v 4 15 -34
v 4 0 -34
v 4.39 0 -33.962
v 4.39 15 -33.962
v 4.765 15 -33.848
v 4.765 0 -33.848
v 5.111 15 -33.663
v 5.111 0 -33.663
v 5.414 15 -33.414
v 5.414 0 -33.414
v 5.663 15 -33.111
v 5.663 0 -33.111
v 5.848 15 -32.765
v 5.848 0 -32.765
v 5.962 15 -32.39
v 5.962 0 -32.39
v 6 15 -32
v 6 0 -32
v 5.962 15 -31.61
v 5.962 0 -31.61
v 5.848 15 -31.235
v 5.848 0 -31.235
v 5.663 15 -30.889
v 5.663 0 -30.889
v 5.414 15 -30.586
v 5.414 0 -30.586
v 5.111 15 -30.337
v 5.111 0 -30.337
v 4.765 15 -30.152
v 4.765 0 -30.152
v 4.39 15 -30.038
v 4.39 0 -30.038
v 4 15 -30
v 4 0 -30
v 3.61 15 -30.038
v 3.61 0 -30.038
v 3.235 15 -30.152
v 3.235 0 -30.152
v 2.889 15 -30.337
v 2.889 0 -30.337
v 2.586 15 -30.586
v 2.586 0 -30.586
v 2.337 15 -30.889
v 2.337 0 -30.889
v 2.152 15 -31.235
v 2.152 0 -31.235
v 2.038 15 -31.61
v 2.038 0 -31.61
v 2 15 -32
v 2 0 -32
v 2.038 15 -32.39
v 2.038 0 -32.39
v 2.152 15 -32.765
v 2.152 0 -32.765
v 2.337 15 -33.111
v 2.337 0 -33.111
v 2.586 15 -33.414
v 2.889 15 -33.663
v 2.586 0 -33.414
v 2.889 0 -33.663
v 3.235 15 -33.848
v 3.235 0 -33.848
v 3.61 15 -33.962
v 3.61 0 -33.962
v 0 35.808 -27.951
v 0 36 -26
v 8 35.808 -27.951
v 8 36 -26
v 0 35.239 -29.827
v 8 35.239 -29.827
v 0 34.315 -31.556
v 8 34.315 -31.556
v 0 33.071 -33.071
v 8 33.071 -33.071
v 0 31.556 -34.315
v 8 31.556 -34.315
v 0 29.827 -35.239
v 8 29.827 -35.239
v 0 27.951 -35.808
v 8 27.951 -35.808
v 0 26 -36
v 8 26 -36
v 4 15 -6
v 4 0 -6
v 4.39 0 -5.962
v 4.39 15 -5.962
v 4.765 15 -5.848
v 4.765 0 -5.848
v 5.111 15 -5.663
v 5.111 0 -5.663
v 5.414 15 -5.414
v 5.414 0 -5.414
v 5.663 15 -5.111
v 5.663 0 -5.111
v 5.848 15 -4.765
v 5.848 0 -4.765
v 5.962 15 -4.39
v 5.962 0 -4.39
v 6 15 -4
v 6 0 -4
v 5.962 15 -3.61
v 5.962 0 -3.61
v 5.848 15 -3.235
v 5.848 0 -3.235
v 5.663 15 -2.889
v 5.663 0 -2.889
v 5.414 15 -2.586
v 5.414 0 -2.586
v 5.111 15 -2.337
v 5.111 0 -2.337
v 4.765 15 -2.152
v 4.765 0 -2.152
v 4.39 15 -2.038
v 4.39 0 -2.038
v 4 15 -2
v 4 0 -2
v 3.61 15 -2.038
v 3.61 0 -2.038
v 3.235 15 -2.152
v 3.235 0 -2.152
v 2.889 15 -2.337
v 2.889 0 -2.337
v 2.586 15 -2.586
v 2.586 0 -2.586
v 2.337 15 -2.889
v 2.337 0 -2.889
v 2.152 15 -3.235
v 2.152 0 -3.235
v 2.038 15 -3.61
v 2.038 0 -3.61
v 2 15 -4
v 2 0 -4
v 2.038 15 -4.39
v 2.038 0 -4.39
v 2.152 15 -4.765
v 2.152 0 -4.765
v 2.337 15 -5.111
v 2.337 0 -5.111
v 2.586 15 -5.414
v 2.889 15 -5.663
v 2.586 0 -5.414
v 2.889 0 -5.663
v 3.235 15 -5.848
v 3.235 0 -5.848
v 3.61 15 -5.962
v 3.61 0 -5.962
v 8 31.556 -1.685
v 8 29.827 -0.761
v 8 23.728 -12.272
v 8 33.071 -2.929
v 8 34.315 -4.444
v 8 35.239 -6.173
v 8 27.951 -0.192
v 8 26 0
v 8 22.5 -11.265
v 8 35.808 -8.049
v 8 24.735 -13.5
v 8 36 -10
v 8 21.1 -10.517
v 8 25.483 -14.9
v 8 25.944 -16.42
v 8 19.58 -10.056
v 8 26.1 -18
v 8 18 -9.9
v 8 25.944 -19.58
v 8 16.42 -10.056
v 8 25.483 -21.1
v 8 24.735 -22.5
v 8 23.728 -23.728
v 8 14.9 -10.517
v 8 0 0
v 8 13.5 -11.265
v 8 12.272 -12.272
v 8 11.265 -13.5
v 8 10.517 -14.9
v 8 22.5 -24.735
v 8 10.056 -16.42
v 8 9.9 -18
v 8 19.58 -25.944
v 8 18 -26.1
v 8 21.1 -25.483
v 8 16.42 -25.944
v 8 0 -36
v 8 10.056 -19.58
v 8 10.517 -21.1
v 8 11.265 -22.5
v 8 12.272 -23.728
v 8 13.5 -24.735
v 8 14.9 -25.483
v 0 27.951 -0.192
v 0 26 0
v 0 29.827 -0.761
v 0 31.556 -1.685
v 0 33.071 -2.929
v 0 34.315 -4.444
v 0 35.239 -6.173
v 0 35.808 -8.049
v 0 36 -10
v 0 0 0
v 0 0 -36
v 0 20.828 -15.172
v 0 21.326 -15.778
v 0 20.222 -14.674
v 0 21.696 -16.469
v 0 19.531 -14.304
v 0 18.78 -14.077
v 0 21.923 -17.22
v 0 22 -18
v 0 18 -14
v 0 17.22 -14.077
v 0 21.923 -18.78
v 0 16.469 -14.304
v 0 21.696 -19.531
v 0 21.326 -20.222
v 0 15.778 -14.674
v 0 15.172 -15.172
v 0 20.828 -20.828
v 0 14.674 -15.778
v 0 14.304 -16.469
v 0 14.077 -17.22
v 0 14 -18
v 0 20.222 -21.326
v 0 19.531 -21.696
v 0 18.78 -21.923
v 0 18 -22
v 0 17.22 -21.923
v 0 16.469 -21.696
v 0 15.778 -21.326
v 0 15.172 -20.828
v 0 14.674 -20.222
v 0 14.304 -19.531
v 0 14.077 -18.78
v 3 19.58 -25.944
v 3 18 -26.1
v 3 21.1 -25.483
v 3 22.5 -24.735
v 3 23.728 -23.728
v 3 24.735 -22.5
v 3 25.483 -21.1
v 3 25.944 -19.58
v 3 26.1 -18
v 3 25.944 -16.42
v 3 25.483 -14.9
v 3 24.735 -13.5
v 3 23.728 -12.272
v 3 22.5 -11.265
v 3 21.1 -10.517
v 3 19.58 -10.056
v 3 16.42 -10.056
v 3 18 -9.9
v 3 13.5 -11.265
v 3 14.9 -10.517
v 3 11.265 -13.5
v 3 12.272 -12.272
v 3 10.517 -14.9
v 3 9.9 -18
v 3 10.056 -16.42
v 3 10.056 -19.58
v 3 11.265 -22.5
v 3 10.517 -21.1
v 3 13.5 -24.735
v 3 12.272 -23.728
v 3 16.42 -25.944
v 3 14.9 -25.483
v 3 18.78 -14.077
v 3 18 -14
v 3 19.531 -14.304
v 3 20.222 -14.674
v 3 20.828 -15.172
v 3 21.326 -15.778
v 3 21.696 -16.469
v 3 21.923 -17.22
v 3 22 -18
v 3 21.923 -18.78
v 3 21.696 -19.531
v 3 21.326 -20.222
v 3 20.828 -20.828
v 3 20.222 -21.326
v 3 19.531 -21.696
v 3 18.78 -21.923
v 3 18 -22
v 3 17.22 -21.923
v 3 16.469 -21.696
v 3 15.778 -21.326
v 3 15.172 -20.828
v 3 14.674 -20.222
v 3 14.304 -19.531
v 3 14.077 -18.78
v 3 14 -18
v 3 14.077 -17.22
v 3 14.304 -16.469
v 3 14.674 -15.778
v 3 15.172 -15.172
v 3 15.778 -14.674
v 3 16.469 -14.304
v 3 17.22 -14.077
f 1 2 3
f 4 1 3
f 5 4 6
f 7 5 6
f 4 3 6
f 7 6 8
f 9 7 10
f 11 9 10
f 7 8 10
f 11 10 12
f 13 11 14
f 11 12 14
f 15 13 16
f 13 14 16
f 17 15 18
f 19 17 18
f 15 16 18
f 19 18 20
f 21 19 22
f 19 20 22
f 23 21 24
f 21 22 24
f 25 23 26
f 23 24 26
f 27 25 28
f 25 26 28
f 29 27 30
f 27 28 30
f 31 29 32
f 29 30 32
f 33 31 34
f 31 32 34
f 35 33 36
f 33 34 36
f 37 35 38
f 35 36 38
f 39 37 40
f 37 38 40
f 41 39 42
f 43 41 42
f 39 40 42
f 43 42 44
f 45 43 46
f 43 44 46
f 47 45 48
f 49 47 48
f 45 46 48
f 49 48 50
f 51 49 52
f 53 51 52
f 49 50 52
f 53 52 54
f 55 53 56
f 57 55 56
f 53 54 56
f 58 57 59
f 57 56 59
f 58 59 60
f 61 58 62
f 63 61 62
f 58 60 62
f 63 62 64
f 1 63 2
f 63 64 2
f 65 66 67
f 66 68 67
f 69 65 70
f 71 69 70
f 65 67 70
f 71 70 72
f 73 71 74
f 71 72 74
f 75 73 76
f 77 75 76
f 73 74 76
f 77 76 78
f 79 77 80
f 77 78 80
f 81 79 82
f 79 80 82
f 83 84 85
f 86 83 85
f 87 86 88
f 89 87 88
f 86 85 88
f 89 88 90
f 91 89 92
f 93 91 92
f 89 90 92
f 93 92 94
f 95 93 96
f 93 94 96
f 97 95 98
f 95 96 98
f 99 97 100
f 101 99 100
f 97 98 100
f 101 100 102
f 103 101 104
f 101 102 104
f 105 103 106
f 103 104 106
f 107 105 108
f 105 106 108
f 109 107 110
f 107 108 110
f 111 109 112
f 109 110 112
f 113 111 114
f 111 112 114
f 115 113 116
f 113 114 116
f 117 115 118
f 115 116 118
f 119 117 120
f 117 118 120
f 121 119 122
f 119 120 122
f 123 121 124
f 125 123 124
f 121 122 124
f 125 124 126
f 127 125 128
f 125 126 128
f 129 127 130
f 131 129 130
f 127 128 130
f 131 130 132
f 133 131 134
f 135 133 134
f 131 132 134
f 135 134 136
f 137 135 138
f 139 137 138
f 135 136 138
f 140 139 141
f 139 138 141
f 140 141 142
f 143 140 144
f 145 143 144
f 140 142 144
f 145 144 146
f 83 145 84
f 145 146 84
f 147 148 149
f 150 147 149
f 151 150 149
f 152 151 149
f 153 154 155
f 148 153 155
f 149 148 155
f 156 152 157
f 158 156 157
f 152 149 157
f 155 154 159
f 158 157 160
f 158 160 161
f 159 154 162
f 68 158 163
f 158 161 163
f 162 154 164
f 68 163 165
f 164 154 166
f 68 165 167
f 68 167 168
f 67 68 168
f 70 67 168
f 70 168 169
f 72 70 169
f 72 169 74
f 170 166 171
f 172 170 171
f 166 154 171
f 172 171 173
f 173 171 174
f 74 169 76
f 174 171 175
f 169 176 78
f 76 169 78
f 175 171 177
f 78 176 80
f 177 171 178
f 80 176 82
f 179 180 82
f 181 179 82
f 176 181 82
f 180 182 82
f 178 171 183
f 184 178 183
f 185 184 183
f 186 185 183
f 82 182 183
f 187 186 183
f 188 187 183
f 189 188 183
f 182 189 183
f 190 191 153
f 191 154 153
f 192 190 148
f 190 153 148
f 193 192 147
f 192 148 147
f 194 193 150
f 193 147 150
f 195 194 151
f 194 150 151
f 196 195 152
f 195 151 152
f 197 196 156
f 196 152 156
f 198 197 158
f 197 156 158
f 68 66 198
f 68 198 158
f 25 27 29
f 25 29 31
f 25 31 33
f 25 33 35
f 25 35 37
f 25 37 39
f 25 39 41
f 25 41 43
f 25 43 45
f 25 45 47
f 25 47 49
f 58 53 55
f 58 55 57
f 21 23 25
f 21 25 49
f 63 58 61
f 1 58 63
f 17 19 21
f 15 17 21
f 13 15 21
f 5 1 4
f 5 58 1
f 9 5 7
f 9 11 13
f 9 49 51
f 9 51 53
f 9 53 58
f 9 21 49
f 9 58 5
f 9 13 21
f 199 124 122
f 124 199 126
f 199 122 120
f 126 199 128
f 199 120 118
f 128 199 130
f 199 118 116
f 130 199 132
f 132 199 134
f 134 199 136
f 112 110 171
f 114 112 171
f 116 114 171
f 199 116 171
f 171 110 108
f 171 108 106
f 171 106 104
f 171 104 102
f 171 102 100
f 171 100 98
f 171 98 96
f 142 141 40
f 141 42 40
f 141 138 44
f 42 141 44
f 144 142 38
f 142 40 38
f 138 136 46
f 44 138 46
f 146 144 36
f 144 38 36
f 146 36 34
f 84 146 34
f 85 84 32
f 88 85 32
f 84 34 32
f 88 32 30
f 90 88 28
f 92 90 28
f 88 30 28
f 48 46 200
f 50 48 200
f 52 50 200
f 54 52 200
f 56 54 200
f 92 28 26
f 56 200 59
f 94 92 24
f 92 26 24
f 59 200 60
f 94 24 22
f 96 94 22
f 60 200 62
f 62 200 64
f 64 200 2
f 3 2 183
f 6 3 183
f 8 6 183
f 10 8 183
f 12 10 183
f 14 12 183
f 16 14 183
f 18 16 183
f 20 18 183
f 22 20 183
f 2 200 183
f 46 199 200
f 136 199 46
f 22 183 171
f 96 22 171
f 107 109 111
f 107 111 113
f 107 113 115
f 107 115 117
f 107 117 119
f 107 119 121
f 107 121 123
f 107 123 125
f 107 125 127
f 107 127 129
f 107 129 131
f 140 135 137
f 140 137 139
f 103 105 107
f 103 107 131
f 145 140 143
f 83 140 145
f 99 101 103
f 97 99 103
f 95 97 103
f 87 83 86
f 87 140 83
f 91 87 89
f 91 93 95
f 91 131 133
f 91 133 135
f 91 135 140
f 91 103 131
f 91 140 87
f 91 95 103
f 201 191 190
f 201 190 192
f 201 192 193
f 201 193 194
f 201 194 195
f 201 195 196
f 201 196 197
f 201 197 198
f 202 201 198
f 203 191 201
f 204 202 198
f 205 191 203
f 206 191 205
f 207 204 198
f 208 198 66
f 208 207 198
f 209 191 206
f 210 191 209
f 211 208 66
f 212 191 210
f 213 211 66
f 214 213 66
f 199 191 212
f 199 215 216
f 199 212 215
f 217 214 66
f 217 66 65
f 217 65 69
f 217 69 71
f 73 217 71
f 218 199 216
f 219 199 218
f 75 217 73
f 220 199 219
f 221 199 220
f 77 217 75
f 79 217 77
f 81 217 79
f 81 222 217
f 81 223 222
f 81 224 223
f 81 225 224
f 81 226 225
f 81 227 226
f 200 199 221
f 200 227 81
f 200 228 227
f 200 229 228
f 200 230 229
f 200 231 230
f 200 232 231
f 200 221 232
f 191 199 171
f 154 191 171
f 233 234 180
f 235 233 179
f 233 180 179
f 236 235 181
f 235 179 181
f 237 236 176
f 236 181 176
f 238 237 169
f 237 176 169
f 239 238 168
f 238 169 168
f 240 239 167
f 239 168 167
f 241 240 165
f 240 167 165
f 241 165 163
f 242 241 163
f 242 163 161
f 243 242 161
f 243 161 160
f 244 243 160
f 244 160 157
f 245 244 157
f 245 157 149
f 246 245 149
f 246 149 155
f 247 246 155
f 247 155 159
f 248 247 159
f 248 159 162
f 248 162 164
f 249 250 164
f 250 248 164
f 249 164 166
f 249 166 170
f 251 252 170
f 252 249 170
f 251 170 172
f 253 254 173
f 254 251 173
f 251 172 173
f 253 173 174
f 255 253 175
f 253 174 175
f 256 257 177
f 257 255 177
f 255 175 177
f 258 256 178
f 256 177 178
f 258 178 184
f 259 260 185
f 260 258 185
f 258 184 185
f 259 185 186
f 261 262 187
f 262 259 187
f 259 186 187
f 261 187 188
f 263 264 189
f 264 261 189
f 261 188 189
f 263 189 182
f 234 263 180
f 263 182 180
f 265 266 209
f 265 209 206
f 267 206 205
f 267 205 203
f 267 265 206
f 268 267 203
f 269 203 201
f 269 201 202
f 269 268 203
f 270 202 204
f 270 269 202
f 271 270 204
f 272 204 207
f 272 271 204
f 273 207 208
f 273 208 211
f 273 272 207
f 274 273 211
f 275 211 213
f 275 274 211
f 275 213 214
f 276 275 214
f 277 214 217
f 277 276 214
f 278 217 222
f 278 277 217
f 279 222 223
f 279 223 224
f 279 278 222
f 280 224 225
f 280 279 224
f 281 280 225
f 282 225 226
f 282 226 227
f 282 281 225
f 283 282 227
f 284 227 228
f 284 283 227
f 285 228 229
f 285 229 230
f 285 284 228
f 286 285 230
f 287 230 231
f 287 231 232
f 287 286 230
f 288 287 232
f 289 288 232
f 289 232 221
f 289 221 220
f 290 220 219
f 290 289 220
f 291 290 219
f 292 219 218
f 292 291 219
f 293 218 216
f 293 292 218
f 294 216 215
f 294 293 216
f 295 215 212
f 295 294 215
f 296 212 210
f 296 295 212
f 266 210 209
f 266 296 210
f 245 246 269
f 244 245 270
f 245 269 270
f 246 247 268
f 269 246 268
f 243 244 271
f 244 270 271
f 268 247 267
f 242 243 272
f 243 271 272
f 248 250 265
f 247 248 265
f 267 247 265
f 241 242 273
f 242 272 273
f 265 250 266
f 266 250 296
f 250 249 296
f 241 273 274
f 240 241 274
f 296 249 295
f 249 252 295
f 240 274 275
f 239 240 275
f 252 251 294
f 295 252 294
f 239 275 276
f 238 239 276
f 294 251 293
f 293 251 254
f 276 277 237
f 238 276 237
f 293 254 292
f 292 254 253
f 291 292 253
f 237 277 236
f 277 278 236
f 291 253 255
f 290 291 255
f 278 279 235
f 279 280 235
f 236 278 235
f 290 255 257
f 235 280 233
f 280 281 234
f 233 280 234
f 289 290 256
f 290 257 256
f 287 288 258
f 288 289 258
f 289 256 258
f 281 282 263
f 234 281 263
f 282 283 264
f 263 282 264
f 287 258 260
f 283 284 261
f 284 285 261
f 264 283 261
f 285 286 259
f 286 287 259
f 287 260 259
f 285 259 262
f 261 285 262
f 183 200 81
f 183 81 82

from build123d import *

# Parameters (mm, degrees)
ESQUISSE1_W             = 8
ESQUISSE1_H             = 36
BOSS_EXTRU_3_DEPTH      = 36
ESQUISSE9_R             = 8.1
ENL_V_MAT_EXTRU_1_DEPTH = 10
BOSS_EXTRU_4_START      = -3
ESQUISSE10_R            = 8.1
ESQUISSE10_R_2          = 4
BOSS_EXTRU_4_DEPTH      = 3
ESQUISSE13_R            = 2
ENL_V_MAT_EXTRU_2_DEPTH = 15
CONG_1_R                = 10


with BuildPart() as part:
    # Esquisse1 → Boss.-Extru.3 (new body)
    with BuildSketch(Plane(origin=(0, 0, 0), x_dir=(1, 0, 0), z_dir=(0, 1, 0))):
        with Locations((4, 18)):
            Rectangle(ESQUISSE1_W, ESQUISSE1_H)
    extrude(amount=BOSS_EXTRU_3_DEPTH)

    # Esquisse9 → Enlèv. mat.-Extru.1 (cut)
    with BuildSketch(Plane(origin=(8, 0, 0), x_dir=(0, 0, -1), z_dir=(1, 0, 0))):
        with Locations((18, 18)):
            Circle(ESQUISSE9_R)
    extrude(amount=-ENL_V_MAT_EXTRU_1_DEPTH, mode=Mode.SUBTRACT)

    # Esquisse10 → Boss.-Extru.4 (add)
    with BuildSketch(Plane.ZY.offset(BOSS_EXTRU_4_START)):
        with Locations((-18, 18)):
            Circle(ESQUISSE10_R)
        with Locations((-18, 18)):
            Circle(ESQUISSE10_R_2, mode=Mode.SUBTRACT)
    extrude(amount=BOSS_EXTRU_4_DEPTH)

    # Esquisse13 → Enlèv. mat.-Extru.2 (cut)
    with BuildSketch(Plane.XZ):
        with Locations((4, -4)):
            Circle(ESQUISSE13_R)
        with Locations((4, -32)):
            Circle(ESQUISSE13_R)
    extrude(amount=-ENL_V_MAT_EXTRU_2_DEPTH, mode=Mode.SUBTRACT)

    # Congé1
    cong_1_edges = [part.edges().sort_by_distance(p)[0] for p in [
        (4, 36, -36),
        (4, 36, 0),
    ]]
    fillet(cong_1_edges, radius=CONG_1_R)


solid = part.part
